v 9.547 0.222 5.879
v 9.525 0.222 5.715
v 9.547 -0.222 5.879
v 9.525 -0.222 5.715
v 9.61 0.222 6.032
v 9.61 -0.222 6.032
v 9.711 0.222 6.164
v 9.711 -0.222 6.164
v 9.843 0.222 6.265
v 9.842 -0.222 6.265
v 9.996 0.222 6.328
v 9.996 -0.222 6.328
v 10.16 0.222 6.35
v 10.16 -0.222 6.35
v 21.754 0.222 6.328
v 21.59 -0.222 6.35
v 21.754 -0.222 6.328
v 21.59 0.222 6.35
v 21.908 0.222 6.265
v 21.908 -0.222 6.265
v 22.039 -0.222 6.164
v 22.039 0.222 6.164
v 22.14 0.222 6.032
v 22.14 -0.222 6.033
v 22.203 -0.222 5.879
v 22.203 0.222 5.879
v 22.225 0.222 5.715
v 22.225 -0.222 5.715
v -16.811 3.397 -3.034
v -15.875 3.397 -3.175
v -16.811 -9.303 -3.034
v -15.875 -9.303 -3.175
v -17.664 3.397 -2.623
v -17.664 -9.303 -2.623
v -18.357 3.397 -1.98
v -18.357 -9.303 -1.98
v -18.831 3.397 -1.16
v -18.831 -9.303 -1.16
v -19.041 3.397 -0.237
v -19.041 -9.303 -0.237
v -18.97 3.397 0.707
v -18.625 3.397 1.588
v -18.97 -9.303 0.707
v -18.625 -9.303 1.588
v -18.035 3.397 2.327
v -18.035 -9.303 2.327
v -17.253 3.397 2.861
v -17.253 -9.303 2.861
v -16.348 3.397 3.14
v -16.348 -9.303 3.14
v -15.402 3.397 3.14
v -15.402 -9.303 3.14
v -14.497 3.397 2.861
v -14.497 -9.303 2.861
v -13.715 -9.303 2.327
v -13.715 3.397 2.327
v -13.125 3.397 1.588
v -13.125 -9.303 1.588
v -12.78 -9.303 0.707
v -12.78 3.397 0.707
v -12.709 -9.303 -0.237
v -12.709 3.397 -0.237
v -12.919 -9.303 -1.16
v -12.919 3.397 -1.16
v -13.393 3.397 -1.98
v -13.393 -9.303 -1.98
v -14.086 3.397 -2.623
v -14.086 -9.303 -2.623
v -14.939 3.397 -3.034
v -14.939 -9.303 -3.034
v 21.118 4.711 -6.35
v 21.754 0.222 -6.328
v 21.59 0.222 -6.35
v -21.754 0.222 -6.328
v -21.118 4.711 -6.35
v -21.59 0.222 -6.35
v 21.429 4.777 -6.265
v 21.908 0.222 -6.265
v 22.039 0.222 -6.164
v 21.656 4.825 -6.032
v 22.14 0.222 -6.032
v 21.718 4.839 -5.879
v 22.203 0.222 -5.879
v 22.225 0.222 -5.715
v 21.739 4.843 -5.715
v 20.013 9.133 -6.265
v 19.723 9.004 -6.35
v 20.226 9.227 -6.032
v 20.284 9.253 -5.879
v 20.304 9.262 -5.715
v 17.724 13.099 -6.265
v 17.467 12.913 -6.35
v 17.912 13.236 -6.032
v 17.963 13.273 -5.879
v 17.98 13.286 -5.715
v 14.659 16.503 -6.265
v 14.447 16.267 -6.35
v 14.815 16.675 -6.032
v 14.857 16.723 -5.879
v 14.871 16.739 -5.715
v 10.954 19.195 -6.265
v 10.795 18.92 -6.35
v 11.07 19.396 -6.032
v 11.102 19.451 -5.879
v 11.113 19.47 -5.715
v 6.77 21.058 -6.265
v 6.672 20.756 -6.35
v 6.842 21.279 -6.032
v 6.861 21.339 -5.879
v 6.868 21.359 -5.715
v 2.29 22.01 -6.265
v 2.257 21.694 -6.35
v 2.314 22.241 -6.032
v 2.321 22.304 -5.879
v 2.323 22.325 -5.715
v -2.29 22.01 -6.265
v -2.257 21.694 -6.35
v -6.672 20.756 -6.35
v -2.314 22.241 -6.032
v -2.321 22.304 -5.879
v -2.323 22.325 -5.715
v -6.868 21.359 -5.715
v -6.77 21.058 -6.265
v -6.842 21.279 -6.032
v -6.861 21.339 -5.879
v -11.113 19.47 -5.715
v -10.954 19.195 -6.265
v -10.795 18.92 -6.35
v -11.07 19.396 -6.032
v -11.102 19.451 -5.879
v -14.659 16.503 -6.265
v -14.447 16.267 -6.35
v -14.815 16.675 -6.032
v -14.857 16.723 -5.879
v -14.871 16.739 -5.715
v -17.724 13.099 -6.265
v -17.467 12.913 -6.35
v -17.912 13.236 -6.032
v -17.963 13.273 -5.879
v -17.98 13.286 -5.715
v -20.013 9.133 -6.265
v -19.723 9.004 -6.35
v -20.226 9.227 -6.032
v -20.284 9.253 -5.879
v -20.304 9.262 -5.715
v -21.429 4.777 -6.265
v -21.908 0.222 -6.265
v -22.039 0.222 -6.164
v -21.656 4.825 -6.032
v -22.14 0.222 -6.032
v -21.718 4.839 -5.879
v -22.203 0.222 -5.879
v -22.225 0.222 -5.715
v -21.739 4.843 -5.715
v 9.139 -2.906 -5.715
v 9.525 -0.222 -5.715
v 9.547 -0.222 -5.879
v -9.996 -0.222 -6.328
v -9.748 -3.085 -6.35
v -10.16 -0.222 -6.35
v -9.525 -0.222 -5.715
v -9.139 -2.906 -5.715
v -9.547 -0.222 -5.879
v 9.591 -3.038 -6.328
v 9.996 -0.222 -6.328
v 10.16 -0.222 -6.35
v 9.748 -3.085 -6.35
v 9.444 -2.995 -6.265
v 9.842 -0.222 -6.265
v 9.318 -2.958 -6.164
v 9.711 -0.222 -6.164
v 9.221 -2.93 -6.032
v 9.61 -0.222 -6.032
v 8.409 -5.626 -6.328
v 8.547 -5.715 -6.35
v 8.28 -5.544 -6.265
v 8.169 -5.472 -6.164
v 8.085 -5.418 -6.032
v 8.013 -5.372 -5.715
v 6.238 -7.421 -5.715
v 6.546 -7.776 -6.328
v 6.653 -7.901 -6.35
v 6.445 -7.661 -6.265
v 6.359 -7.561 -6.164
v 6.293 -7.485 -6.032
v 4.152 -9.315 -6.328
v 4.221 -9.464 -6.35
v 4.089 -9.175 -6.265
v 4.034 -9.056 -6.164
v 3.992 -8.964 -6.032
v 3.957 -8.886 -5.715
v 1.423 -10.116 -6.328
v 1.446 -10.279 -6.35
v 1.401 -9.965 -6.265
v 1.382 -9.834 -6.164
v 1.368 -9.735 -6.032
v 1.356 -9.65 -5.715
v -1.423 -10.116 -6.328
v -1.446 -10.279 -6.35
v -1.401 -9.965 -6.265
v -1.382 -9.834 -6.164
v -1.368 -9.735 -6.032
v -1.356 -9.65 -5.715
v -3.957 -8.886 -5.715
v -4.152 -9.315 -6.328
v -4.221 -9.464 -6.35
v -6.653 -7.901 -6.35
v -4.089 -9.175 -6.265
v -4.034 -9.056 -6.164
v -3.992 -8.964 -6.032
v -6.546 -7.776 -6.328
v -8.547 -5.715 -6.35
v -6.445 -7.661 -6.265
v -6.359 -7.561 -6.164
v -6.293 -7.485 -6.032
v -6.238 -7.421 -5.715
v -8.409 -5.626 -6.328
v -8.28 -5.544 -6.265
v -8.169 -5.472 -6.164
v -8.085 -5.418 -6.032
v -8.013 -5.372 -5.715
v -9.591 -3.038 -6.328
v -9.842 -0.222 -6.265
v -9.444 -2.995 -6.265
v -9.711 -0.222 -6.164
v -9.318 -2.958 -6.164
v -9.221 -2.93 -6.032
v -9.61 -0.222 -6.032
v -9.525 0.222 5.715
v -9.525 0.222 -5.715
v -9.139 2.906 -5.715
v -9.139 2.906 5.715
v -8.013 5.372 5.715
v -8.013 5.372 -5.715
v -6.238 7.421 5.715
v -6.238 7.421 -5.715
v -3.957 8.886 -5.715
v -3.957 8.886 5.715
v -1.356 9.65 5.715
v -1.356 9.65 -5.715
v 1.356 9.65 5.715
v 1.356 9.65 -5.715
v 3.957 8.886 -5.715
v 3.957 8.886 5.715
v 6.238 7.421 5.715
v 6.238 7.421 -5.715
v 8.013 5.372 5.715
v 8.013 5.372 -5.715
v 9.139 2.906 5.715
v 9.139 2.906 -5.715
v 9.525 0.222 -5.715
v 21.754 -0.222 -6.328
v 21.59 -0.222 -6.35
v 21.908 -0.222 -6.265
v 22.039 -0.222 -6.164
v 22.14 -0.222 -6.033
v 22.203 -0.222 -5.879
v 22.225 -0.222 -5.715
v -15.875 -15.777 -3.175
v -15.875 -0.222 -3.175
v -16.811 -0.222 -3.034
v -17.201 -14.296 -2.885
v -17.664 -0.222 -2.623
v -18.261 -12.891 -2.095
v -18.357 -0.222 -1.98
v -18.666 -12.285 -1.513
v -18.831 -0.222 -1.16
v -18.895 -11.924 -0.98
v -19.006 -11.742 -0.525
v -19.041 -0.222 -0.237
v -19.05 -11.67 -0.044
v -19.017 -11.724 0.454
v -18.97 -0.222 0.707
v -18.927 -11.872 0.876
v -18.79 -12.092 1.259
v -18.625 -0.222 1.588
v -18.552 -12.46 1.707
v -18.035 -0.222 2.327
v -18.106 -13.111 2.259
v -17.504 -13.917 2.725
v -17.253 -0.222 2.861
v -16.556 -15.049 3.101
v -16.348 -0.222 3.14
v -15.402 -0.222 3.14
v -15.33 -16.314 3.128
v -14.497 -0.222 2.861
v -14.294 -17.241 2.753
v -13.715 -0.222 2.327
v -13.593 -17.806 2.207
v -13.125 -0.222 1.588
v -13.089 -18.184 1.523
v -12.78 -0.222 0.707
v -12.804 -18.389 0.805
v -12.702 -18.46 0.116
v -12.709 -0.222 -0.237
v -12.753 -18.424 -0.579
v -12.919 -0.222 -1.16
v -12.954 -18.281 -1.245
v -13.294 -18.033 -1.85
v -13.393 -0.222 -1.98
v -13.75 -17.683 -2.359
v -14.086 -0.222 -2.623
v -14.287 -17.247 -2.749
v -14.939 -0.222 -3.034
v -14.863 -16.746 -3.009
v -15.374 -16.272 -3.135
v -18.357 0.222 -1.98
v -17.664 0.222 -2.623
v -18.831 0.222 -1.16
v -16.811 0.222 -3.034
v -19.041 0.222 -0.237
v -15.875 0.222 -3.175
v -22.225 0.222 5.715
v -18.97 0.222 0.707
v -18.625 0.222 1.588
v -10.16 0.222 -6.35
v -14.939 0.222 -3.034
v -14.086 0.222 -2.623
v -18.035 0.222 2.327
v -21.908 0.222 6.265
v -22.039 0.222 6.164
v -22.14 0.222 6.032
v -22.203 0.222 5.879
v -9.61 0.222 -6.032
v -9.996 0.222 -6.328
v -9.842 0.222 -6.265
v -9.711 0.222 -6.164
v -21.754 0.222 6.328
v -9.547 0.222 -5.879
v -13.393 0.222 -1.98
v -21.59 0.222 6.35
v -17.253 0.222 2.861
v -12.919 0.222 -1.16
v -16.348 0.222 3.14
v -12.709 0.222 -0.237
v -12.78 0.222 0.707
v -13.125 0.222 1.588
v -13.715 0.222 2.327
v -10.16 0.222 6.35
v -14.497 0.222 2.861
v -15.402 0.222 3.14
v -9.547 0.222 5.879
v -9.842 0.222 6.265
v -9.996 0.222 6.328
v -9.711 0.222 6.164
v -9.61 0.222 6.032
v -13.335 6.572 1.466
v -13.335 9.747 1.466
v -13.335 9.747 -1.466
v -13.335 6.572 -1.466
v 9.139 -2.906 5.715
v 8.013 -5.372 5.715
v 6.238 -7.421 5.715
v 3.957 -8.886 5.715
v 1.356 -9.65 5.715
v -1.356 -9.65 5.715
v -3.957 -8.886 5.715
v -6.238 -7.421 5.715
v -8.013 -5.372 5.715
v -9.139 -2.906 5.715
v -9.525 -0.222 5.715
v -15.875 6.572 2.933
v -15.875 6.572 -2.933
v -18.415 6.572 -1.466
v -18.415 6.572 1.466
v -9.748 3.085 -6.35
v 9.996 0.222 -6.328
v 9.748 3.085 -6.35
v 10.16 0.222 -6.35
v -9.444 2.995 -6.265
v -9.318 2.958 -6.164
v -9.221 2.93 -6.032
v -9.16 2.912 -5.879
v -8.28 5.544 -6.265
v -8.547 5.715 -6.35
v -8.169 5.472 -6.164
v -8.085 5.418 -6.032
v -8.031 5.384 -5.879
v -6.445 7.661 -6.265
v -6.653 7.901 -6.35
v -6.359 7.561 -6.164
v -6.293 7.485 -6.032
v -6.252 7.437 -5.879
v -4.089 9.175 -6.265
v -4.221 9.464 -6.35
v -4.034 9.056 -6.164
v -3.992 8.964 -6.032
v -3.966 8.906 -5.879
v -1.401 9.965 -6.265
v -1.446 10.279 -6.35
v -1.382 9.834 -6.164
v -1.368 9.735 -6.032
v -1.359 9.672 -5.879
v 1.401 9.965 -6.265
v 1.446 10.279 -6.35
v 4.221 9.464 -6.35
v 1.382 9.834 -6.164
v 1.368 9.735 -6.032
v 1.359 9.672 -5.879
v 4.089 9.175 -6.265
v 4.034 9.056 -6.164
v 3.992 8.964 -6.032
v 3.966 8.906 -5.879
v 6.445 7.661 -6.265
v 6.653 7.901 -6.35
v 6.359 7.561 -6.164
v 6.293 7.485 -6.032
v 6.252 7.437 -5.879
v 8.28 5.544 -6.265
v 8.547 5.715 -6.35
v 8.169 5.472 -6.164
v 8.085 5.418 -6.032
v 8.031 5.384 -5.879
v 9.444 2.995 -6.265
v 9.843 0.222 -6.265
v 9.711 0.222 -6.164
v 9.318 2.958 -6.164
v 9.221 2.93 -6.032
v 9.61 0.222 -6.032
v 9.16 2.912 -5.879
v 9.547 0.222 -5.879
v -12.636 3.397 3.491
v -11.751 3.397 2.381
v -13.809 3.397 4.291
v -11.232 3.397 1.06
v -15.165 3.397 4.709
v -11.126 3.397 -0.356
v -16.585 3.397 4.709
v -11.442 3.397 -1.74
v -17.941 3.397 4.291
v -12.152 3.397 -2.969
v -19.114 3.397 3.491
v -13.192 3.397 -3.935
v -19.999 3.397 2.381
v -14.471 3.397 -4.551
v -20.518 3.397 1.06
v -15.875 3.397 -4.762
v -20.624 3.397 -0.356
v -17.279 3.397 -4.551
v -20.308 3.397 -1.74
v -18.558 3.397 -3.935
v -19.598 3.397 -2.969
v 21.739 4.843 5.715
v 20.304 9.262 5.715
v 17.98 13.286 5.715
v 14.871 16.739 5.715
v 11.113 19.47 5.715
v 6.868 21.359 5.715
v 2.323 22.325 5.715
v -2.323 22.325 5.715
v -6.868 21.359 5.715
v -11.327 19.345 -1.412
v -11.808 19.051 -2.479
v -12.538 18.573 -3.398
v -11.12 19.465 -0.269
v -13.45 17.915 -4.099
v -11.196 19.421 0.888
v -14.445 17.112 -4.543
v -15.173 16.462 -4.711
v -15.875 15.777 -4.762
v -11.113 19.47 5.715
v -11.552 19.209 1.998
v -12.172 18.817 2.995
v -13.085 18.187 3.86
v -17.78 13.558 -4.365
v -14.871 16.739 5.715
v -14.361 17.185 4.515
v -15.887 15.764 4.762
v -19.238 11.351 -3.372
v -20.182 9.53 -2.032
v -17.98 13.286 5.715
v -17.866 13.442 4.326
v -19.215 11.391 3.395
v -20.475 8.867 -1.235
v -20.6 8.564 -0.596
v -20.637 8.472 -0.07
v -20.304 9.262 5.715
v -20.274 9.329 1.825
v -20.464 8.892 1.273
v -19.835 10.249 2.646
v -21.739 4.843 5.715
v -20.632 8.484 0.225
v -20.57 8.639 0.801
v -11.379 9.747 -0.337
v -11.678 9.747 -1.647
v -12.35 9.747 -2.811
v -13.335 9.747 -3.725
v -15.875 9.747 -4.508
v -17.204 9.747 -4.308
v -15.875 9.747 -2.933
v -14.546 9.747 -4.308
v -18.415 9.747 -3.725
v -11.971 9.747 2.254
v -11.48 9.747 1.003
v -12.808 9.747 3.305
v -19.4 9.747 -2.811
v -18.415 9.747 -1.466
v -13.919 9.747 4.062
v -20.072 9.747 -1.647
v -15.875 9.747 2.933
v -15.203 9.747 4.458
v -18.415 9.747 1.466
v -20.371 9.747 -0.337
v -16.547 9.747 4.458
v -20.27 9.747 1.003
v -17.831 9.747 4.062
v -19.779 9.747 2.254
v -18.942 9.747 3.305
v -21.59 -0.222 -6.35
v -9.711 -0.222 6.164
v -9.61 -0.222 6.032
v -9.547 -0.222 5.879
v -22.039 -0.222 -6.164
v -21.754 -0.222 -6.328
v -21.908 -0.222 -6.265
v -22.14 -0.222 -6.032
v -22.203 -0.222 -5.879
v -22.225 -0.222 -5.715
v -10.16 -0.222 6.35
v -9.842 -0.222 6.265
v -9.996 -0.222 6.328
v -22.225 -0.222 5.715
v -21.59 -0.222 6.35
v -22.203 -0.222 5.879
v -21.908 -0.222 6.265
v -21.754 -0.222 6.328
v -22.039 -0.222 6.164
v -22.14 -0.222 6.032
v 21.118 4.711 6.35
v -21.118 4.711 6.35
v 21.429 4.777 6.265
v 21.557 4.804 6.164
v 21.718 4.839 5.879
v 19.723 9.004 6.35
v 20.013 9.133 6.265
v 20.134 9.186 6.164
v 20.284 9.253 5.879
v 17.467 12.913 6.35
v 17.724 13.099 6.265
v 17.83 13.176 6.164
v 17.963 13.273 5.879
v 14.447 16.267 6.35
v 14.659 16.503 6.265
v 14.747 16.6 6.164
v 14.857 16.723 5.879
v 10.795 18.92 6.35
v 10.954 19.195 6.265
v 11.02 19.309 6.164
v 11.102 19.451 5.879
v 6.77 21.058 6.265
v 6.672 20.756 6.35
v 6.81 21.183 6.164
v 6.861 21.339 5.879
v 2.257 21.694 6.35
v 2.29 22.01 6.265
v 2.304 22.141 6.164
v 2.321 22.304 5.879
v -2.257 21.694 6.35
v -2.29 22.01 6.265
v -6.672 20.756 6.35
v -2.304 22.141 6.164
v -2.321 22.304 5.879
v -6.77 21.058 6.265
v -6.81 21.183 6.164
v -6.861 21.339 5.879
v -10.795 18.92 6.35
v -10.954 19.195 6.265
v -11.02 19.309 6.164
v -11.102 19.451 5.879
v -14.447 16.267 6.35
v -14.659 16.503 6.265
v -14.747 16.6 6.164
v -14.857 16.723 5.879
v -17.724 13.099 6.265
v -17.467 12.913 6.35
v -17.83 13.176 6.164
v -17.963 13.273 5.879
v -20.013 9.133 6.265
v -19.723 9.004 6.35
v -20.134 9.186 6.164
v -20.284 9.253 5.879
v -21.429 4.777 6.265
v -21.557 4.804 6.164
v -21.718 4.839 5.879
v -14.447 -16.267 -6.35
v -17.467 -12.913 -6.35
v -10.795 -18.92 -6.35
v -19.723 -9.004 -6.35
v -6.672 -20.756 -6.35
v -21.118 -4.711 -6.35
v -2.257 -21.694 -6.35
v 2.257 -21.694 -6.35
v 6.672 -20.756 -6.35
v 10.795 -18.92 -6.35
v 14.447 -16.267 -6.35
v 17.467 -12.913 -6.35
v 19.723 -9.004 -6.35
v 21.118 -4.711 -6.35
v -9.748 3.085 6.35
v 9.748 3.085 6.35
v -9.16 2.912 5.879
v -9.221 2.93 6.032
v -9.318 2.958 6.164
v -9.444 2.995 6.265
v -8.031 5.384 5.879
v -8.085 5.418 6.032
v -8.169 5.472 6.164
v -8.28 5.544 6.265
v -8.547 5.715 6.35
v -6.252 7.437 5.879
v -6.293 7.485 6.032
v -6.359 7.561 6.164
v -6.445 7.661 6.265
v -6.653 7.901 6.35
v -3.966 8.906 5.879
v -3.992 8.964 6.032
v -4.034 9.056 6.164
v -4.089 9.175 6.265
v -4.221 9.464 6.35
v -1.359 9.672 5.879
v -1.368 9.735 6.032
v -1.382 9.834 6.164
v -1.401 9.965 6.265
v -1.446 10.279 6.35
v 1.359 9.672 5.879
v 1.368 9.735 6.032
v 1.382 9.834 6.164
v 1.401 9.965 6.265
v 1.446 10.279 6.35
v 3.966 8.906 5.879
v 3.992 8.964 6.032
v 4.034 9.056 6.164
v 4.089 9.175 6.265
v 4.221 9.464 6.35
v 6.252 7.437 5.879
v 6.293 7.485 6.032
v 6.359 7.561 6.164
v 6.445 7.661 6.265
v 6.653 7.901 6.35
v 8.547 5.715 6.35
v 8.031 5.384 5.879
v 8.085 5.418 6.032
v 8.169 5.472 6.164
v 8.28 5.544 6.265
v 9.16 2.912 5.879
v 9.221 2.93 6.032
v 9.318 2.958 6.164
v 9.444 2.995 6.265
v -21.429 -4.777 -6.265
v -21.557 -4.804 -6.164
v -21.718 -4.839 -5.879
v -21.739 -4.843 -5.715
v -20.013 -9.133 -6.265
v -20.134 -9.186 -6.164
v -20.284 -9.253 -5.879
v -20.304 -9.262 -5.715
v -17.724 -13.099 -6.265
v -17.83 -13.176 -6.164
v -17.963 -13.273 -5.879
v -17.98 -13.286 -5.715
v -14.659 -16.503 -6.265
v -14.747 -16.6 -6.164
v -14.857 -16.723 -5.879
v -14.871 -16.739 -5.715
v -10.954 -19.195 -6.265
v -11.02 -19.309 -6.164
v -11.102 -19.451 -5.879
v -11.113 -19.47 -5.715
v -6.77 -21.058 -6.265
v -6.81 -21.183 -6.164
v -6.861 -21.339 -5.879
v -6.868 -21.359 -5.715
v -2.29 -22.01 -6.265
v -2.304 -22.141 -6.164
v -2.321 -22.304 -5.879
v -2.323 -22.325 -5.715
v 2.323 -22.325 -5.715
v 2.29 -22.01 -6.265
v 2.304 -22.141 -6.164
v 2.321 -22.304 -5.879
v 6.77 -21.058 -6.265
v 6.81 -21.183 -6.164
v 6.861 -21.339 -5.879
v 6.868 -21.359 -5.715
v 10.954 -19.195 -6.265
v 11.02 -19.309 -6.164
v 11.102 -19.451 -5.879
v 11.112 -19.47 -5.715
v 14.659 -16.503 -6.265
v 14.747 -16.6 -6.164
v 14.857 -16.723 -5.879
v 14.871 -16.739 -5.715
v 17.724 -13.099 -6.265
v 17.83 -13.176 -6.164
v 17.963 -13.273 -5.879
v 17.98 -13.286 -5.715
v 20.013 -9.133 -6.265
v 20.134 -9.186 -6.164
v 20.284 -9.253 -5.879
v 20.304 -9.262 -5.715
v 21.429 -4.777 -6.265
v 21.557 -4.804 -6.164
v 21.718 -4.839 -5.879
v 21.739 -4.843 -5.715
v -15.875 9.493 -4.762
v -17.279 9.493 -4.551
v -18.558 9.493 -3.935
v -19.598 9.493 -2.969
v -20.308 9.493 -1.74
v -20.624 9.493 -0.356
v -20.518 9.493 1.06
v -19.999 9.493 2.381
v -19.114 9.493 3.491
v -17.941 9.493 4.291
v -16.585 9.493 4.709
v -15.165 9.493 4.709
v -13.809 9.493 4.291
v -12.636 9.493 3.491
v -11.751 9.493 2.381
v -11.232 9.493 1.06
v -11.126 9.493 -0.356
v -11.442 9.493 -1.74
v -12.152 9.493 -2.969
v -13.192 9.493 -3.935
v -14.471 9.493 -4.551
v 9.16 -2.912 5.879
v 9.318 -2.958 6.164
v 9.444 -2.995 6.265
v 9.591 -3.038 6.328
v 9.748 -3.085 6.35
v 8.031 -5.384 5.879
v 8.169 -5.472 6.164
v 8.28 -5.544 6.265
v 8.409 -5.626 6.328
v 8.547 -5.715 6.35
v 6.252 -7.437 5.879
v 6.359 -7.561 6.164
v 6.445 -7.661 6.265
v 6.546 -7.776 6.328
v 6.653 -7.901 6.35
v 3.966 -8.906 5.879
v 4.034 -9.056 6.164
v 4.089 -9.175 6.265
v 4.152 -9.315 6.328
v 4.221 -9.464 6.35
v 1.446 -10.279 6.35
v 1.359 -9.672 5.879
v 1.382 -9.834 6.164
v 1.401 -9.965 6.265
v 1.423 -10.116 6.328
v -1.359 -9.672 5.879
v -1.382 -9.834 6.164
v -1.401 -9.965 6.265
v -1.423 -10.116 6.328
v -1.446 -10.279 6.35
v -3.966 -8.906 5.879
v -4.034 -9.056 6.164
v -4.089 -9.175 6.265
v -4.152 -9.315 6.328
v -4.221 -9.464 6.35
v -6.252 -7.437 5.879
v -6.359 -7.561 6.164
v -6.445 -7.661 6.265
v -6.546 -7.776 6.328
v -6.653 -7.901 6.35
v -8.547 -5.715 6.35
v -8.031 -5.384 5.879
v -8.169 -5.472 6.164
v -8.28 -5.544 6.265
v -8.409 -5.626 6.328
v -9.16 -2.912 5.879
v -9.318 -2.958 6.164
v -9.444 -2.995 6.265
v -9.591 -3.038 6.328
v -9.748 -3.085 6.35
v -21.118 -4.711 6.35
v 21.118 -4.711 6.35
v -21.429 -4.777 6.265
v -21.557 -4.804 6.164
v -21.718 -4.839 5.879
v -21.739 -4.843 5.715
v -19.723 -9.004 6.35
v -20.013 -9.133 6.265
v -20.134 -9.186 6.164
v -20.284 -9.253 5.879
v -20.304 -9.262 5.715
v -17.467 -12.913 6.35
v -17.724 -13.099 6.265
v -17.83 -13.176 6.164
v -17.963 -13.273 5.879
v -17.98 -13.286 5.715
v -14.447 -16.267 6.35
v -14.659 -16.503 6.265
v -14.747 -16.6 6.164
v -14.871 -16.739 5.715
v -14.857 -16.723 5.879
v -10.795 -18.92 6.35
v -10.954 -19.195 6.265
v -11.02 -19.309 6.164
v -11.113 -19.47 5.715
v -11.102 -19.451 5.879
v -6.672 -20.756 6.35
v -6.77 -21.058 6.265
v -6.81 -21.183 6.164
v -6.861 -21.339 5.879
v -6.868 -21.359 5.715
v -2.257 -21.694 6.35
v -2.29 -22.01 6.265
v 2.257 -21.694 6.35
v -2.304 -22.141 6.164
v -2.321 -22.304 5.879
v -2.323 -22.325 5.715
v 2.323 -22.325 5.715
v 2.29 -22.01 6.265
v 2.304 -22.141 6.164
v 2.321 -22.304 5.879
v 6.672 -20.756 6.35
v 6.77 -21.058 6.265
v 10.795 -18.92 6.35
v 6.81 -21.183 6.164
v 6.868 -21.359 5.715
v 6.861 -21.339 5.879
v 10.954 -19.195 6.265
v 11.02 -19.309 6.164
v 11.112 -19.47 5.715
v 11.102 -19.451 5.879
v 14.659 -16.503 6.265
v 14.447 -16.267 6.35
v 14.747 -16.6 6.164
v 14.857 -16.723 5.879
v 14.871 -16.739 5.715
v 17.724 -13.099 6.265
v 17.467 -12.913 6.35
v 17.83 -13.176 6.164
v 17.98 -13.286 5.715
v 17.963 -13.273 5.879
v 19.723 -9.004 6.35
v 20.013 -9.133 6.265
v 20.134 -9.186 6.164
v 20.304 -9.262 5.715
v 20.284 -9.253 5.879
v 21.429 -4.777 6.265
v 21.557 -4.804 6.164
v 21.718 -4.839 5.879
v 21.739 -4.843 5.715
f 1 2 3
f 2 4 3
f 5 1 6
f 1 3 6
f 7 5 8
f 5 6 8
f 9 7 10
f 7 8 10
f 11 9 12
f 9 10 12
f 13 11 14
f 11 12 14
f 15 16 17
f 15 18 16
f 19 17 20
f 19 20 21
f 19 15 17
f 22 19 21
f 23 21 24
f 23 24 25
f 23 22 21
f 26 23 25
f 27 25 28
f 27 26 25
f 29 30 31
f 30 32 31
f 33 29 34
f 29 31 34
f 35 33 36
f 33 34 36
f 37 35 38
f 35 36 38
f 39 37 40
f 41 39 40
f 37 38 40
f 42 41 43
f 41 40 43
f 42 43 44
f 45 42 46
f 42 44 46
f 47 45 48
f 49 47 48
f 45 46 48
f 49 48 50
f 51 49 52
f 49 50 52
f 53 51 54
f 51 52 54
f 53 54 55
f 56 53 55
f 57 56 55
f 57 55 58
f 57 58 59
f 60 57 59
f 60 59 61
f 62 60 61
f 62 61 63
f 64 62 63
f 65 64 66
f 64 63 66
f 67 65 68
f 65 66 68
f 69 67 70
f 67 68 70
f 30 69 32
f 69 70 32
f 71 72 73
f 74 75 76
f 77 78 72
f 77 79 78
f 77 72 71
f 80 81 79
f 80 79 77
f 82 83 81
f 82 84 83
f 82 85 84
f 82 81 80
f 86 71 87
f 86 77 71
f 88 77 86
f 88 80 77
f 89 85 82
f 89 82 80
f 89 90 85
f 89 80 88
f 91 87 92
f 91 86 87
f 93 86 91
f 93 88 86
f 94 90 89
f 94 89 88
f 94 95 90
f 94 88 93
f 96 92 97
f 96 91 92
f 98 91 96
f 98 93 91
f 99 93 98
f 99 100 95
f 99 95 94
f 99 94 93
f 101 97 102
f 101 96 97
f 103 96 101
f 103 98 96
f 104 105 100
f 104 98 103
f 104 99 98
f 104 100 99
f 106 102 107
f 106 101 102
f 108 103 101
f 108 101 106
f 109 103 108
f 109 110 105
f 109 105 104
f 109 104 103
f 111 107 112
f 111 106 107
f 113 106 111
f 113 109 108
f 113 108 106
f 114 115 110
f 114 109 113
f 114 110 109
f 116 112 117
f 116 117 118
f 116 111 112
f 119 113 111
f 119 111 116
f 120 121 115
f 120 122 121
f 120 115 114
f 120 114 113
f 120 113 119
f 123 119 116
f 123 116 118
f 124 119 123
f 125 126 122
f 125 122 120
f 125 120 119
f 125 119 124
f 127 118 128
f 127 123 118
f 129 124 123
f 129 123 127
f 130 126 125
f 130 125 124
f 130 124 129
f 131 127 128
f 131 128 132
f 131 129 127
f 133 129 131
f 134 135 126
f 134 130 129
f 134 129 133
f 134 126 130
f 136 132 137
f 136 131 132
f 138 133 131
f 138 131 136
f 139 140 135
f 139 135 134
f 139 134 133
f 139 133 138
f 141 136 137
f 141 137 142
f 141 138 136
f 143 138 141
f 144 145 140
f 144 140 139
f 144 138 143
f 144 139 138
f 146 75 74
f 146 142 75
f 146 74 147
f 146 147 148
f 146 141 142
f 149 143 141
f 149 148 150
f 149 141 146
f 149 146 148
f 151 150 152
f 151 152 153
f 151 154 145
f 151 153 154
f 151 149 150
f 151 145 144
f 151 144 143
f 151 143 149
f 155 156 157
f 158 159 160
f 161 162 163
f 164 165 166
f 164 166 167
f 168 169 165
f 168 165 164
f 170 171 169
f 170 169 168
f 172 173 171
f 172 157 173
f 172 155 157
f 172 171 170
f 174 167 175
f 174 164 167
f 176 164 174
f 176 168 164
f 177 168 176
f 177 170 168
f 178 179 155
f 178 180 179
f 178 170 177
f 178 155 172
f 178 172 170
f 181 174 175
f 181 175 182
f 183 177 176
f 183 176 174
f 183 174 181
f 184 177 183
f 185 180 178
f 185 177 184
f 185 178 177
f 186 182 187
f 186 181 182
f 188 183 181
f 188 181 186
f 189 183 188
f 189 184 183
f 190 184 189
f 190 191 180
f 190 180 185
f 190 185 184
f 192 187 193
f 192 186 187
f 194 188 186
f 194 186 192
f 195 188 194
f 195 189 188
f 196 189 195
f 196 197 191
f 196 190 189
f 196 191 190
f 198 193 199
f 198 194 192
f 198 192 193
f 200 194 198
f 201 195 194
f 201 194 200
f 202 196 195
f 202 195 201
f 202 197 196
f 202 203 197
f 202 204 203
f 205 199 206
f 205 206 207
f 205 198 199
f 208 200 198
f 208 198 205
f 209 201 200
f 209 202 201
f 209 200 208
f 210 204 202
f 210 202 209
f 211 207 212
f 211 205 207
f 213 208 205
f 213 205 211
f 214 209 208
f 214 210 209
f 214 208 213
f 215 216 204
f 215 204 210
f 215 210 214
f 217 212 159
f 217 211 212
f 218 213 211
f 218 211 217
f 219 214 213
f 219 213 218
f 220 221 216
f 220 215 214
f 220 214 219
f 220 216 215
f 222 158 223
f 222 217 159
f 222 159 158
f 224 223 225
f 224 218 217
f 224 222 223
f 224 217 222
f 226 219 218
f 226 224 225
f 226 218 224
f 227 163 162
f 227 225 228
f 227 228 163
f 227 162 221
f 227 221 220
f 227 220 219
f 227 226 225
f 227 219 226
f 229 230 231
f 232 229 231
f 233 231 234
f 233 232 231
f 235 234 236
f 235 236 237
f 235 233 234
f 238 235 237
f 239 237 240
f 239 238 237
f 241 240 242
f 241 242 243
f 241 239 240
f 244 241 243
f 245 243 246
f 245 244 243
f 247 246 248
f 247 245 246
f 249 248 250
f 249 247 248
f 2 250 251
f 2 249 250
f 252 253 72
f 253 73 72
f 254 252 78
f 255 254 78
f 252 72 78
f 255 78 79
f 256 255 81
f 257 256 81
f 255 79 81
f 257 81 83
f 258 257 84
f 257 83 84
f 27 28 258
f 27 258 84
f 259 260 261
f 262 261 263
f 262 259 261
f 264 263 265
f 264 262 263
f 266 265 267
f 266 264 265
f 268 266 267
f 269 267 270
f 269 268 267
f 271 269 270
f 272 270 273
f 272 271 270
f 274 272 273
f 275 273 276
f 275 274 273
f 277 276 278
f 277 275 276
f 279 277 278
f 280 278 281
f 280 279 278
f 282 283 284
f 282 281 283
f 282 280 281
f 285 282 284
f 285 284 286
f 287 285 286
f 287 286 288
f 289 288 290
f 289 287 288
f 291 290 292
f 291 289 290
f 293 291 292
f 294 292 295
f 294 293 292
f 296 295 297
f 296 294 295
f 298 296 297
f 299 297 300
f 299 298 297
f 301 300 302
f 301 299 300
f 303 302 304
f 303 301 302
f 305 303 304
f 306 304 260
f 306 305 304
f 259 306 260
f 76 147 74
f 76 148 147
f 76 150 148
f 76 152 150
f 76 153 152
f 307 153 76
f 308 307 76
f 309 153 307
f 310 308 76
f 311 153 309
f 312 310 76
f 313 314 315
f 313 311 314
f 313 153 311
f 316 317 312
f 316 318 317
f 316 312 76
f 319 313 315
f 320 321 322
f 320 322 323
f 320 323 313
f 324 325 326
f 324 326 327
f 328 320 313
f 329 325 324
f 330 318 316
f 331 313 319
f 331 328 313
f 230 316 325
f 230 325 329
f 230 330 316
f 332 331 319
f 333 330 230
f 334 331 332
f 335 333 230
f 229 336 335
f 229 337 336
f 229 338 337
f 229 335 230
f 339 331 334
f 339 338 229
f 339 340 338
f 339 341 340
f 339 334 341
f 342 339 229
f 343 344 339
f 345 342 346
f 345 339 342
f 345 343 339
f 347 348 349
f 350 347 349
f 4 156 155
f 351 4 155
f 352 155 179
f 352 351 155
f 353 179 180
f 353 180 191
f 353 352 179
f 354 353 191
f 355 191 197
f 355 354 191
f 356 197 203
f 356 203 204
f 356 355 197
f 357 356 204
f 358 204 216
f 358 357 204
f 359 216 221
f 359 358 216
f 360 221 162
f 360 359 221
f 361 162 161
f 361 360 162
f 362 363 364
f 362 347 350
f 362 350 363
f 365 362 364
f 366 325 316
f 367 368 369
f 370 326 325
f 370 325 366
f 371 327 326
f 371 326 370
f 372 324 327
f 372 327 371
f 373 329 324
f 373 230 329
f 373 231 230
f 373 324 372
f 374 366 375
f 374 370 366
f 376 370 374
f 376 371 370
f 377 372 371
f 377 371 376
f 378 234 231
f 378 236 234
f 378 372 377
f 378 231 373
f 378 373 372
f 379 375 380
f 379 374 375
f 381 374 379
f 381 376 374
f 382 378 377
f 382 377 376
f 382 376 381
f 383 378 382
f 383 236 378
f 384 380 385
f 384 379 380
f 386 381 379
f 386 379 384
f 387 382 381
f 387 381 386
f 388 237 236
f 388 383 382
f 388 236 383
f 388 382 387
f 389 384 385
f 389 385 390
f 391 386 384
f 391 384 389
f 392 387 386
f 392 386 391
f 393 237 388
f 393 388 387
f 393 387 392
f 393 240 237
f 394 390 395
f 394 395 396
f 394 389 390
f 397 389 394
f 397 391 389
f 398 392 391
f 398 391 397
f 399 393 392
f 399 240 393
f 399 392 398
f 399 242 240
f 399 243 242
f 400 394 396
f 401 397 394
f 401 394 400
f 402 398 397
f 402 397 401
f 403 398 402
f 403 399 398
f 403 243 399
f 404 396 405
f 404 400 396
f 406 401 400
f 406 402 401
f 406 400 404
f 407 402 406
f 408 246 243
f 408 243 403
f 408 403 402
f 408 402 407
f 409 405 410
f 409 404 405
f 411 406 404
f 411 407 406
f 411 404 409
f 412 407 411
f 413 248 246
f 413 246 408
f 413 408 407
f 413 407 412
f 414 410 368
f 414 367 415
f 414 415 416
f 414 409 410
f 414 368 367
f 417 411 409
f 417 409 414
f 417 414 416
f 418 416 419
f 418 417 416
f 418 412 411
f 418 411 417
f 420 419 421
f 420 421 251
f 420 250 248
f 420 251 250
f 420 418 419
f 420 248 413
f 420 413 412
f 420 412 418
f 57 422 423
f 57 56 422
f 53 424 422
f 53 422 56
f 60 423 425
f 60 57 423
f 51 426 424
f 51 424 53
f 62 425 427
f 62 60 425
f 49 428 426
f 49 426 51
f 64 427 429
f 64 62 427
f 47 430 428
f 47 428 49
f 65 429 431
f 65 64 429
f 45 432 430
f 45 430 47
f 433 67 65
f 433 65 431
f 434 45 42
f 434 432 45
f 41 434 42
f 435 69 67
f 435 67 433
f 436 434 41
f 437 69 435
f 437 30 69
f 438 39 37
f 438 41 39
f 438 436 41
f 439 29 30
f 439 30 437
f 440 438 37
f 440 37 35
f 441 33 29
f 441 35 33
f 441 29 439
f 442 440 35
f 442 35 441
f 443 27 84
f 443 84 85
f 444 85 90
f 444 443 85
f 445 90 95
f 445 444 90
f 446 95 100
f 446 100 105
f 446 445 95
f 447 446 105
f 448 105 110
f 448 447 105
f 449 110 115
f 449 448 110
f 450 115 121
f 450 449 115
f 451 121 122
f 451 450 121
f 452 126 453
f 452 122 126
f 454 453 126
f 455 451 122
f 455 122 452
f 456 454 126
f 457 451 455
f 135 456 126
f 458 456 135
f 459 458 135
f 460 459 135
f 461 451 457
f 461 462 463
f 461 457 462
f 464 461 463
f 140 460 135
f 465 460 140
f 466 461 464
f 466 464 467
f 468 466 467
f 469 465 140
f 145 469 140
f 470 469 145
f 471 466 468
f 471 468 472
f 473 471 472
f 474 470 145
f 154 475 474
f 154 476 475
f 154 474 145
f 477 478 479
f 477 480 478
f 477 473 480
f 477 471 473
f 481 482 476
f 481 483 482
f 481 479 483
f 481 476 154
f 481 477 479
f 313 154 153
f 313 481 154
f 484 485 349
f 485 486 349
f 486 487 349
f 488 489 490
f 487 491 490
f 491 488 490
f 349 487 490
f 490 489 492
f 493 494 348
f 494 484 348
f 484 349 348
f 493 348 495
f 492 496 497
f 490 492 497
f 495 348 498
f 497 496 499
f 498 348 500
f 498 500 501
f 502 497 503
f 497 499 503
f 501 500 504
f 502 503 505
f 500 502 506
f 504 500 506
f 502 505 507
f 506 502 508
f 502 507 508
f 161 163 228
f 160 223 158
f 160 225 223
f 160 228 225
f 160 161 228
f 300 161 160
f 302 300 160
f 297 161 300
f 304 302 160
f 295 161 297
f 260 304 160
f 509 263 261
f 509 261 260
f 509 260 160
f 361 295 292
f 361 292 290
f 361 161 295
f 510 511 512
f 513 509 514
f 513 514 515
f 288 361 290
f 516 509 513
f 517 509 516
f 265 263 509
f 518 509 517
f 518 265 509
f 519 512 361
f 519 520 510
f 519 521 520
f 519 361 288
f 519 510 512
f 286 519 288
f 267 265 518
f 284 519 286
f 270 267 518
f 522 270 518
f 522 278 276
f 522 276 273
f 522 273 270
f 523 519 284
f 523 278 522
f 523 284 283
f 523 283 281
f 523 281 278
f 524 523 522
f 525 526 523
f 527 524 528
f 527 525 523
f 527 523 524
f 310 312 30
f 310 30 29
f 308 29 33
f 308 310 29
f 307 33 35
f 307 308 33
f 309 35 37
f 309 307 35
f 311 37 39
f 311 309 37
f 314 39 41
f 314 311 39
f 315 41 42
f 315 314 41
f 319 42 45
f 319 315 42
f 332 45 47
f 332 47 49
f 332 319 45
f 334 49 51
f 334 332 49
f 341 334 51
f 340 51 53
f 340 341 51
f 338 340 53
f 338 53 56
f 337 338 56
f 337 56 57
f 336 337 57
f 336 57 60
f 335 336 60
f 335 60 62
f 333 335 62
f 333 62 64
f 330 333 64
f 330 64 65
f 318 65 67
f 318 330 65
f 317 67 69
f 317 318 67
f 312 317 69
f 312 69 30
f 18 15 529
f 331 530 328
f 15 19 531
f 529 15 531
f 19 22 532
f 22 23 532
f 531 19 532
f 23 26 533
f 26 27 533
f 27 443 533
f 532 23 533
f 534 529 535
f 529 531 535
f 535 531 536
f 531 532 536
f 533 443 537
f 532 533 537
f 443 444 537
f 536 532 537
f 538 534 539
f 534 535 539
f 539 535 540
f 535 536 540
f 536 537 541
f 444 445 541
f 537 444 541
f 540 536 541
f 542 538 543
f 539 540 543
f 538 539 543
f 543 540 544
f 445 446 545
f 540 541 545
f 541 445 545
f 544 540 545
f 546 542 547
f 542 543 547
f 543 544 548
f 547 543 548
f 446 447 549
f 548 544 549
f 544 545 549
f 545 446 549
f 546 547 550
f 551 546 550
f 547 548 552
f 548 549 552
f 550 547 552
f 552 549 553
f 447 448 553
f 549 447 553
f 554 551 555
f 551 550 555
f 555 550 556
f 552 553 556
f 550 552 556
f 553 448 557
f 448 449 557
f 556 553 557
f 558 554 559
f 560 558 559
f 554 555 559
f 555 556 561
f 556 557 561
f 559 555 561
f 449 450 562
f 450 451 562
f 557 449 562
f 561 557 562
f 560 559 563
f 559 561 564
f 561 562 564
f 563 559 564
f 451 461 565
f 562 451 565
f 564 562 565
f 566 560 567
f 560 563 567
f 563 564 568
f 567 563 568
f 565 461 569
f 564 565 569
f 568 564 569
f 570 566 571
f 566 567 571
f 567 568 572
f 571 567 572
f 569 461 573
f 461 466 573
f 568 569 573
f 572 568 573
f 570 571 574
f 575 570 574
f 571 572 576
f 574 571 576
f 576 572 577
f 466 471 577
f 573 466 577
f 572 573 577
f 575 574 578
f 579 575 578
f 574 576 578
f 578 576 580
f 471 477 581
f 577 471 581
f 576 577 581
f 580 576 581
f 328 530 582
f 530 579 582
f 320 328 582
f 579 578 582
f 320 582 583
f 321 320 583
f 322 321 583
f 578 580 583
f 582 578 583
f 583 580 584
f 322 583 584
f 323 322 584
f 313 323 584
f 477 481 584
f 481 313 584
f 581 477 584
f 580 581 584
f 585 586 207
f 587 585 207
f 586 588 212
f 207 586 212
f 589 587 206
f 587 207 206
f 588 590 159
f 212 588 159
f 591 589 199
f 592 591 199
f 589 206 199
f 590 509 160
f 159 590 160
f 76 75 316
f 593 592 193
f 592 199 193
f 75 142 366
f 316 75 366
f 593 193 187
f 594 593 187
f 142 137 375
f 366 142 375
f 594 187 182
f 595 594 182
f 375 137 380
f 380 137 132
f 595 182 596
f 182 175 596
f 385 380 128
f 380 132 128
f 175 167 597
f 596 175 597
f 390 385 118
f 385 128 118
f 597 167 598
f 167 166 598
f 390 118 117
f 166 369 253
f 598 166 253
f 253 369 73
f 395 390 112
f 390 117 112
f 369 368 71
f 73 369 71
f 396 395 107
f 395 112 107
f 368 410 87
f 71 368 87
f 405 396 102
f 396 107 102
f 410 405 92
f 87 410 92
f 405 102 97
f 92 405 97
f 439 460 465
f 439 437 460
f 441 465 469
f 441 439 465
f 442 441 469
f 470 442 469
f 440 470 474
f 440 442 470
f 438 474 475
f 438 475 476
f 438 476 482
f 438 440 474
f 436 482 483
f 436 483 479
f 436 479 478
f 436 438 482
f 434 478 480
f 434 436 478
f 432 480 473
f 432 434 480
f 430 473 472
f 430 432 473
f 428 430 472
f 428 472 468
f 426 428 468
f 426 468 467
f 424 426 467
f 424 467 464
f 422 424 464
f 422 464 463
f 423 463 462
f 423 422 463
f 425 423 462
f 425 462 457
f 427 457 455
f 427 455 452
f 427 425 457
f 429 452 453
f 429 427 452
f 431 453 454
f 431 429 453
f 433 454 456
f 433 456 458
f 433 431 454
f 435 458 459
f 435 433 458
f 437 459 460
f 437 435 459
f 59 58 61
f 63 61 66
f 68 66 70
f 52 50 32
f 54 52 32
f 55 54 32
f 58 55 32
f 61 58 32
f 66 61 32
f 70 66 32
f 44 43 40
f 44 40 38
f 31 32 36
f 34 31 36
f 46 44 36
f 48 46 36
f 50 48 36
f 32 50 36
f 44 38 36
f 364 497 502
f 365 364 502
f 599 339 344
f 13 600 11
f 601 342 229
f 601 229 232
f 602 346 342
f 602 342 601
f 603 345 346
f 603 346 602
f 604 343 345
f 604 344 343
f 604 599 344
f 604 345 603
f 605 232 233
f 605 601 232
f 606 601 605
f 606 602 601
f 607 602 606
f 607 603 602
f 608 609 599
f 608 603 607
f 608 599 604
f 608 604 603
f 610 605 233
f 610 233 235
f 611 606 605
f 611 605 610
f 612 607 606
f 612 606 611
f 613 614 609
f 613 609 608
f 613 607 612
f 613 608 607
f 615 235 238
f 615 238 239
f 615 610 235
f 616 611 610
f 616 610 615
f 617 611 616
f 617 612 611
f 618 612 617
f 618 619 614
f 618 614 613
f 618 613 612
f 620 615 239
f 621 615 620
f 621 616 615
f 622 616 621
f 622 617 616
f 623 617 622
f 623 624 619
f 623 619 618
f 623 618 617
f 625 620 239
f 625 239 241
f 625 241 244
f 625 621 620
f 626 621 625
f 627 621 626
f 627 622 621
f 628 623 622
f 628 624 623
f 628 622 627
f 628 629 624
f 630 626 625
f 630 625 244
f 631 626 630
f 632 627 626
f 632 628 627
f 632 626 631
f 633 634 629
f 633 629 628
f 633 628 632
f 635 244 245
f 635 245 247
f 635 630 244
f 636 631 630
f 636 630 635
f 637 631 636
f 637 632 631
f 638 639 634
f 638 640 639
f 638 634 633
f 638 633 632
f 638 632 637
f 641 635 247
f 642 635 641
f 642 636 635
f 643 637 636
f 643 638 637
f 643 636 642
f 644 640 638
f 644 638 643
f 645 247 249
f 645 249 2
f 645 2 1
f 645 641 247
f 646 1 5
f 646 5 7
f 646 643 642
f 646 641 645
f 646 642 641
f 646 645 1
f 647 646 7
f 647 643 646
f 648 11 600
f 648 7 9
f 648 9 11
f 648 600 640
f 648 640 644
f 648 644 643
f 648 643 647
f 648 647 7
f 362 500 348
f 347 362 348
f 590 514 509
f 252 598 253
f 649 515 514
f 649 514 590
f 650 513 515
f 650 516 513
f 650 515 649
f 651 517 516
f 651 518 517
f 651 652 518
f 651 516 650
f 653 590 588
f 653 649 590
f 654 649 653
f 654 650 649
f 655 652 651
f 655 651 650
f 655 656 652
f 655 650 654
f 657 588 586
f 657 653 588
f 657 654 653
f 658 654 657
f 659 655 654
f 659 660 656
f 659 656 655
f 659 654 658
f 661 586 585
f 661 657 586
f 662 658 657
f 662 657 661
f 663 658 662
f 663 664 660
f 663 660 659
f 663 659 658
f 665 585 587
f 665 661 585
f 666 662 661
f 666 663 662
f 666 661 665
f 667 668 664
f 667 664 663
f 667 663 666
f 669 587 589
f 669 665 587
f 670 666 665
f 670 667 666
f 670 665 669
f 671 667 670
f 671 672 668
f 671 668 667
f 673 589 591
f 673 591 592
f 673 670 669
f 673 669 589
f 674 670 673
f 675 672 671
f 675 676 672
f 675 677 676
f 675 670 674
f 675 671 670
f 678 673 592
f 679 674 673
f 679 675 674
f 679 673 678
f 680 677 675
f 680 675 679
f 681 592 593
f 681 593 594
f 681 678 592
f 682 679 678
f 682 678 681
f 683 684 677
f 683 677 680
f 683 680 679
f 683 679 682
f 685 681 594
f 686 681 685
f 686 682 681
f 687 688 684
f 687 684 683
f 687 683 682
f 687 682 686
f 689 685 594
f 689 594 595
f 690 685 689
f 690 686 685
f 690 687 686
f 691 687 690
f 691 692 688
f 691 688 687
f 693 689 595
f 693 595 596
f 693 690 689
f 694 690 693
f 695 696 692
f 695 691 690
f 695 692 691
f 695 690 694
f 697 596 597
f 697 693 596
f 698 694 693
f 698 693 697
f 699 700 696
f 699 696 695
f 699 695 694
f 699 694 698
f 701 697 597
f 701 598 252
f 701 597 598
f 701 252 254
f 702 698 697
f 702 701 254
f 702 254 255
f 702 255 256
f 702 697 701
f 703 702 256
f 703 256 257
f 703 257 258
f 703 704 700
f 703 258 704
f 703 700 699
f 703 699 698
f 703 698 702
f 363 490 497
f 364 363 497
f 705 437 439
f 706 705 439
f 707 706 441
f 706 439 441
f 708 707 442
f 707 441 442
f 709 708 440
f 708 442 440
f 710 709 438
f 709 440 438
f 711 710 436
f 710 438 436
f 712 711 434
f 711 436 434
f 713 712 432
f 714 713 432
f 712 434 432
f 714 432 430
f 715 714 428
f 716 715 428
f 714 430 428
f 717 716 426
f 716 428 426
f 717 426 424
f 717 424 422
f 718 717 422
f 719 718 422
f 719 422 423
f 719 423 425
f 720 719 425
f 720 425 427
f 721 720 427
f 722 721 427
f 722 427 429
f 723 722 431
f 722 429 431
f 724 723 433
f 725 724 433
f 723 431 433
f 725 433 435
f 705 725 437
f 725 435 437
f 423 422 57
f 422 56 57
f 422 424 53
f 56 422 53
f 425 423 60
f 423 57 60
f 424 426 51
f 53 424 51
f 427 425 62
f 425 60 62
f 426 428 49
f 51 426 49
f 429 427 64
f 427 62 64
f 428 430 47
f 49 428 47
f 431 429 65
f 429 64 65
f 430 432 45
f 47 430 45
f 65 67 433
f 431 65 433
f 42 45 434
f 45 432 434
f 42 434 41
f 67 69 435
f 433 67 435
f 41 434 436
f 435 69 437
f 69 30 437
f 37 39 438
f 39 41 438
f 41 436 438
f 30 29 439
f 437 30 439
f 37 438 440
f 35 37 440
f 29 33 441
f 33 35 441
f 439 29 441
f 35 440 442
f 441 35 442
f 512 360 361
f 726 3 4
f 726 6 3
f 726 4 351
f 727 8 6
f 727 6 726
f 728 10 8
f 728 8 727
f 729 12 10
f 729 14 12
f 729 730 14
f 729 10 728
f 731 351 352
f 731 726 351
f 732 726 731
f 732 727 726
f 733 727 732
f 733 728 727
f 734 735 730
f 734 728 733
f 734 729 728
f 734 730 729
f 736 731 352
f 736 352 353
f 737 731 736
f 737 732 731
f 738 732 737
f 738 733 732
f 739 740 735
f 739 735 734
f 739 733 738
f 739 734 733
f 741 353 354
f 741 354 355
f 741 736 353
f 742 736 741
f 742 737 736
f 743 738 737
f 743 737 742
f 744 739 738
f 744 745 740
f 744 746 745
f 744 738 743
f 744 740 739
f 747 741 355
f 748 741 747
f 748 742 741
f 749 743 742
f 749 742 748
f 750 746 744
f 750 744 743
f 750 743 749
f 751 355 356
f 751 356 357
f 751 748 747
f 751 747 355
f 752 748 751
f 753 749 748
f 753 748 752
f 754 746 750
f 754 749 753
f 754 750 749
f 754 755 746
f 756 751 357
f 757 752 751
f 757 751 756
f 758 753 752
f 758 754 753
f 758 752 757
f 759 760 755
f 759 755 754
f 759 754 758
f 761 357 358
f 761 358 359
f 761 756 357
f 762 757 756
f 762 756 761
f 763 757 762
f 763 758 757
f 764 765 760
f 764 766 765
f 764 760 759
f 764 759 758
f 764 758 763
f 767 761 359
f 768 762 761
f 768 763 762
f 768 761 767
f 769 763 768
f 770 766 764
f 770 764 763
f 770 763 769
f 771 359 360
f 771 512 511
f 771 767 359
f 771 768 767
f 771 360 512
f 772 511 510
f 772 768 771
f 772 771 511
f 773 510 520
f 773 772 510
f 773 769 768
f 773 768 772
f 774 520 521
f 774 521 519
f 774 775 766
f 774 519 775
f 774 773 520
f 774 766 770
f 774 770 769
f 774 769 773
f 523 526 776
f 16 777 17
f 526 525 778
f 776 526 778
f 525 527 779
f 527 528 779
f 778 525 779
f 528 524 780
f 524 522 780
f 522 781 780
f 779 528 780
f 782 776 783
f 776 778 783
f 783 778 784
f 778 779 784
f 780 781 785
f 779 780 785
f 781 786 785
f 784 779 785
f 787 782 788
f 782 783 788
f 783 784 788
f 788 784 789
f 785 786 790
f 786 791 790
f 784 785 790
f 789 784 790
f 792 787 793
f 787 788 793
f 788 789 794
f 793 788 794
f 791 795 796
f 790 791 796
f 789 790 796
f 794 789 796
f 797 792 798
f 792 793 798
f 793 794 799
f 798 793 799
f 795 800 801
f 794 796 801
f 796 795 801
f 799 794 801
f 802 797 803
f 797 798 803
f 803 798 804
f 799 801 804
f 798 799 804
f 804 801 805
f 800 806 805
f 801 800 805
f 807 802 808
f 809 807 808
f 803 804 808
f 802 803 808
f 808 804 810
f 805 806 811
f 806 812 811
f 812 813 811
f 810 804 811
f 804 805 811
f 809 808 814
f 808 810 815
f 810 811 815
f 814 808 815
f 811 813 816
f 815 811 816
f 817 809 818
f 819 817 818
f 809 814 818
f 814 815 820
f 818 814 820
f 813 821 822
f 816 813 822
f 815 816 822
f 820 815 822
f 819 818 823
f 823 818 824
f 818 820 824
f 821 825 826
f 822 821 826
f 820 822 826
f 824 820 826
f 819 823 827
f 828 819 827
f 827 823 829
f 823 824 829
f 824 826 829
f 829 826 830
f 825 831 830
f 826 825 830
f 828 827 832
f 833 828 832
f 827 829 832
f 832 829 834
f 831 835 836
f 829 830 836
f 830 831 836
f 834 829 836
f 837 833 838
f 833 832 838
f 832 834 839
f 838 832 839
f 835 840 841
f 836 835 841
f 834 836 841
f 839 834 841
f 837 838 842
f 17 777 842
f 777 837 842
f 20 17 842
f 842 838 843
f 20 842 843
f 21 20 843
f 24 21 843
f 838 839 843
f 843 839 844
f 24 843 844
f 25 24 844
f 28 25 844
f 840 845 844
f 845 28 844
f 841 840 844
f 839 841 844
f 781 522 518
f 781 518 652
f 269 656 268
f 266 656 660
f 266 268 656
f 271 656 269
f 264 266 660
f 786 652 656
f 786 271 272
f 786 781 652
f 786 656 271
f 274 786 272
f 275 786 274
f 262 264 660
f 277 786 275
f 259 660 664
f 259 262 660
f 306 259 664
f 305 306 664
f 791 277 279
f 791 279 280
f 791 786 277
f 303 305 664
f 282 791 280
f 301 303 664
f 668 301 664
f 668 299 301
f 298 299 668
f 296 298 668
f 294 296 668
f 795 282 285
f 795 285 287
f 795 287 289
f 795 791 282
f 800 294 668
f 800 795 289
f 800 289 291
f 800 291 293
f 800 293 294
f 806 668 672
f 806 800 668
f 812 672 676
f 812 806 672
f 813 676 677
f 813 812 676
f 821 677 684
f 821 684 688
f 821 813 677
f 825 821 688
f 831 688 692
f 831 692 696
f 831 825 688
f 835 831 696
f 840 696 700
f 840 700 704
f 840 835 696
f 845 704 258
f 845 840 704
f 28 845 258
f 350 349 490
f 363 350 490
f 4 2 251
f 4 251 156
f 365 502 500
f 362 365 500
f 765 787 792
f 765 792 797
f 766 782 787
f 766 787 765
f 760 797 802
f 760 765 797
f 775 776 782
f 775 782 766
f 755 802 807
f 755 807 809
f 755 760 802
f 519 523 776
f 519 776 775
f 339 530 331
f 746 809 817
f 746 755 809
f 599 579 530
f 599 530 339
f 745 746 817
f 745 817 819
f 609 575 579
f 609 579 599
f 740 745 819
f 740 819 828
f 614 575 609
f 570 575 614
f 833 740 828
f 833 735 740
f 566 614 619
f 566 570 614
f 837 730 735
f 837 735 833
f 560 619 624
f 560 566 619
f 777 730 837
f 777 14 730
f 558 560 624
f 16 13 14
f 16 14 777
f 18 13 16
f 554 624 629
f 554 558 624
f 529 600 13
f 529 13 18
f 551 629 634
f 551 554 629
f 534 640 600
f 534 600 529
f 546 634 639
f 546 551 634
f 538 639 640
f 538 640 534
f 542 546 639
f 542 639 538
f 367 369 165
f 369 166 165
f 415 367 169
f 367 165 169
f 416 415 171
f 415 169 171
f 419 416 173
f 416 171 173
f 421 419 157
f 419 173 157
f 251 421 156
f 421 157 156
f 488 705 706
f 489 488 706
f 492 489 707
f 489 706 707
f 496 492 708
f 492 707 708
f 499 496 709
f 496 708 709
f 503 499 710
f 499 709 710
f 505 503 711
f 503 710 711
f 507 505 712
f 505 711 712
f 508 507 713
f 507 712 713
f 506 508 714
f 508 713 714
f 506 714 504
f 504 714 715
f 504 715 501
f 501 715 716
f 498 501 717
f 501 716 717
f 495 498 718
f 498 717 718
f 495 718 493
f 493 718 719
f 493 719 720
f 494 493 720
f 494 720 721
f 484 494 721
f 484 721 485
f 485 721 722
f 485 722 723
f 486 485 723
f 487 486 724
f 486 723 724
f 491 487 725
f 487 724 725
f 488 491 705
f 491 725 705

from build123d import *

# Parameters (mm, degrees)
EXTRUDE1_DEPTH     = 6.35
CUT_EXTRUDE2_DEPTH = 3.175
FILLET1_R          = 0.635
CHAMFER2_SIZE      = 0.254


with BuildPart() as part:
    # Sketch1 → Extrude1 (new, symmetric)
    with BuildSketch(Plane.XY):
        with BuildLine():
            Line((-22.225, 0.22225), (-9.525, 0.22225))
            ThreePointArc((-9.525, 0.22225), (0, 9.74725), (9.525, 0.22225))
            Line((9.525, 0.22225), (9.525, -0.22225))
            ThreePointArc((9.525, -0.22225), (0, -9.74725), (-9.525, -0.22225))
            Line((-9.525, -0.22225), (-22.225, -0.22225))
            ThreePointArc((-22.225, -0.22225), (0, -22.44725), (22.225, -0.22225))
            Line((22.225, -0.22225), (22.225, 0.22225))
            ThreePointArc((22.225, 0.22225), (0, 22.44725), (-22.225, 0.22225))
        make_face()
    extrude(amount=EXTRUDE1_DEPTH, both=True)

    # Sketch4 → Cut-Revolve1 (revolve, cut)
    with BuildSketch(Plane.XY, mode=Mode.PRIVATE) as cut_revolve1_sk:
        Polygon((-15.875, 22.44725), (-11.1125, 22.44725), (-11.1125, 3.39725), (-12.7, 3.39725), (-12.7, -22.44725), (-15.875, -22.44725), align=None)
    revolve(cut_revolve1_sk.sketch.rotate(Axis((-15.875, -22.44725, 0), (0, 1, 0)), 90), axis=Axis((-15.875, -22.44725, 0), (0, 1, 0)), mode=Mode.SUBTRACT)

    # Fillet1
    fillet1_edges = [part.edges().sort_by_distance(p)[0] for p in [
        (0, 9.74725, 6.35),
        (9.525, 0, 6.35),
        (0, -9.74725, 6.35),
        (0, -22.44725, 6.35),
        (22.225, 0, 6.35),
        (0, 22.44725, 6.35),
        (22.225, 0, -6.35),
        (0, -22.44725, -6.35),
        (0, -9.74725, -6.35),
        (9.525, 0, -6.35),
        (0, 9.74725, -6.35),
        (0, 22.44725, -6.35),
    ]]
    fillet(fillet1_edges, radius=FILLET1_R)


with BuildPart() as body_2:
    # Sketch6 → Revolve1 (revolve)
    with BuildSketch(Plane.XY, mode=Mode.PRIVATE) as revolve1_sk:
        Polygon((-15.875, 9.74725), (-11.1125, 9.74725), (-11.1125, 3.39725), (-12.7, 3.39725), (-12.7, -9.30275), (-15.875, -9.30275), align=None)
    revolve(revolve1_sk.sketch.rotate(Axis((-15.875, -9.30275, 0), (0, 1, 0)), 90), axis=Axis((-15.875, -9.30275, 0), (0, 1, 0)))

    # Sketch7 → Cut-Extrude2 (cut)
    with BuildSketch(Plane(origin=(0, 9.74725, 0), x_dir=(-1, 0, 0), z_dir=(0, 1, 0))):
        Polygon((15.875, -2.932939367), (18.415, -1.466469684), (18.415, 1.466469684), (15.875, 2.932939367), (13.335, 1.466469684), (13.335, -1.466469684), align=None)
    extrude(amount=-CUT_EXTRUDE2_DEPTH, mode=Mode.SUBTRACT)

    # Chamfer2
    chamfer2_edges = [body_2.edges().sort_by_distance(p)[0] for p in [
        (-15.875, 9.74725, 4.7625),
    ]]
    chamfer(chamfer2_edges, length=CHAMFER2_SIZE)


solid = Compound([part.part, body_2.part])
